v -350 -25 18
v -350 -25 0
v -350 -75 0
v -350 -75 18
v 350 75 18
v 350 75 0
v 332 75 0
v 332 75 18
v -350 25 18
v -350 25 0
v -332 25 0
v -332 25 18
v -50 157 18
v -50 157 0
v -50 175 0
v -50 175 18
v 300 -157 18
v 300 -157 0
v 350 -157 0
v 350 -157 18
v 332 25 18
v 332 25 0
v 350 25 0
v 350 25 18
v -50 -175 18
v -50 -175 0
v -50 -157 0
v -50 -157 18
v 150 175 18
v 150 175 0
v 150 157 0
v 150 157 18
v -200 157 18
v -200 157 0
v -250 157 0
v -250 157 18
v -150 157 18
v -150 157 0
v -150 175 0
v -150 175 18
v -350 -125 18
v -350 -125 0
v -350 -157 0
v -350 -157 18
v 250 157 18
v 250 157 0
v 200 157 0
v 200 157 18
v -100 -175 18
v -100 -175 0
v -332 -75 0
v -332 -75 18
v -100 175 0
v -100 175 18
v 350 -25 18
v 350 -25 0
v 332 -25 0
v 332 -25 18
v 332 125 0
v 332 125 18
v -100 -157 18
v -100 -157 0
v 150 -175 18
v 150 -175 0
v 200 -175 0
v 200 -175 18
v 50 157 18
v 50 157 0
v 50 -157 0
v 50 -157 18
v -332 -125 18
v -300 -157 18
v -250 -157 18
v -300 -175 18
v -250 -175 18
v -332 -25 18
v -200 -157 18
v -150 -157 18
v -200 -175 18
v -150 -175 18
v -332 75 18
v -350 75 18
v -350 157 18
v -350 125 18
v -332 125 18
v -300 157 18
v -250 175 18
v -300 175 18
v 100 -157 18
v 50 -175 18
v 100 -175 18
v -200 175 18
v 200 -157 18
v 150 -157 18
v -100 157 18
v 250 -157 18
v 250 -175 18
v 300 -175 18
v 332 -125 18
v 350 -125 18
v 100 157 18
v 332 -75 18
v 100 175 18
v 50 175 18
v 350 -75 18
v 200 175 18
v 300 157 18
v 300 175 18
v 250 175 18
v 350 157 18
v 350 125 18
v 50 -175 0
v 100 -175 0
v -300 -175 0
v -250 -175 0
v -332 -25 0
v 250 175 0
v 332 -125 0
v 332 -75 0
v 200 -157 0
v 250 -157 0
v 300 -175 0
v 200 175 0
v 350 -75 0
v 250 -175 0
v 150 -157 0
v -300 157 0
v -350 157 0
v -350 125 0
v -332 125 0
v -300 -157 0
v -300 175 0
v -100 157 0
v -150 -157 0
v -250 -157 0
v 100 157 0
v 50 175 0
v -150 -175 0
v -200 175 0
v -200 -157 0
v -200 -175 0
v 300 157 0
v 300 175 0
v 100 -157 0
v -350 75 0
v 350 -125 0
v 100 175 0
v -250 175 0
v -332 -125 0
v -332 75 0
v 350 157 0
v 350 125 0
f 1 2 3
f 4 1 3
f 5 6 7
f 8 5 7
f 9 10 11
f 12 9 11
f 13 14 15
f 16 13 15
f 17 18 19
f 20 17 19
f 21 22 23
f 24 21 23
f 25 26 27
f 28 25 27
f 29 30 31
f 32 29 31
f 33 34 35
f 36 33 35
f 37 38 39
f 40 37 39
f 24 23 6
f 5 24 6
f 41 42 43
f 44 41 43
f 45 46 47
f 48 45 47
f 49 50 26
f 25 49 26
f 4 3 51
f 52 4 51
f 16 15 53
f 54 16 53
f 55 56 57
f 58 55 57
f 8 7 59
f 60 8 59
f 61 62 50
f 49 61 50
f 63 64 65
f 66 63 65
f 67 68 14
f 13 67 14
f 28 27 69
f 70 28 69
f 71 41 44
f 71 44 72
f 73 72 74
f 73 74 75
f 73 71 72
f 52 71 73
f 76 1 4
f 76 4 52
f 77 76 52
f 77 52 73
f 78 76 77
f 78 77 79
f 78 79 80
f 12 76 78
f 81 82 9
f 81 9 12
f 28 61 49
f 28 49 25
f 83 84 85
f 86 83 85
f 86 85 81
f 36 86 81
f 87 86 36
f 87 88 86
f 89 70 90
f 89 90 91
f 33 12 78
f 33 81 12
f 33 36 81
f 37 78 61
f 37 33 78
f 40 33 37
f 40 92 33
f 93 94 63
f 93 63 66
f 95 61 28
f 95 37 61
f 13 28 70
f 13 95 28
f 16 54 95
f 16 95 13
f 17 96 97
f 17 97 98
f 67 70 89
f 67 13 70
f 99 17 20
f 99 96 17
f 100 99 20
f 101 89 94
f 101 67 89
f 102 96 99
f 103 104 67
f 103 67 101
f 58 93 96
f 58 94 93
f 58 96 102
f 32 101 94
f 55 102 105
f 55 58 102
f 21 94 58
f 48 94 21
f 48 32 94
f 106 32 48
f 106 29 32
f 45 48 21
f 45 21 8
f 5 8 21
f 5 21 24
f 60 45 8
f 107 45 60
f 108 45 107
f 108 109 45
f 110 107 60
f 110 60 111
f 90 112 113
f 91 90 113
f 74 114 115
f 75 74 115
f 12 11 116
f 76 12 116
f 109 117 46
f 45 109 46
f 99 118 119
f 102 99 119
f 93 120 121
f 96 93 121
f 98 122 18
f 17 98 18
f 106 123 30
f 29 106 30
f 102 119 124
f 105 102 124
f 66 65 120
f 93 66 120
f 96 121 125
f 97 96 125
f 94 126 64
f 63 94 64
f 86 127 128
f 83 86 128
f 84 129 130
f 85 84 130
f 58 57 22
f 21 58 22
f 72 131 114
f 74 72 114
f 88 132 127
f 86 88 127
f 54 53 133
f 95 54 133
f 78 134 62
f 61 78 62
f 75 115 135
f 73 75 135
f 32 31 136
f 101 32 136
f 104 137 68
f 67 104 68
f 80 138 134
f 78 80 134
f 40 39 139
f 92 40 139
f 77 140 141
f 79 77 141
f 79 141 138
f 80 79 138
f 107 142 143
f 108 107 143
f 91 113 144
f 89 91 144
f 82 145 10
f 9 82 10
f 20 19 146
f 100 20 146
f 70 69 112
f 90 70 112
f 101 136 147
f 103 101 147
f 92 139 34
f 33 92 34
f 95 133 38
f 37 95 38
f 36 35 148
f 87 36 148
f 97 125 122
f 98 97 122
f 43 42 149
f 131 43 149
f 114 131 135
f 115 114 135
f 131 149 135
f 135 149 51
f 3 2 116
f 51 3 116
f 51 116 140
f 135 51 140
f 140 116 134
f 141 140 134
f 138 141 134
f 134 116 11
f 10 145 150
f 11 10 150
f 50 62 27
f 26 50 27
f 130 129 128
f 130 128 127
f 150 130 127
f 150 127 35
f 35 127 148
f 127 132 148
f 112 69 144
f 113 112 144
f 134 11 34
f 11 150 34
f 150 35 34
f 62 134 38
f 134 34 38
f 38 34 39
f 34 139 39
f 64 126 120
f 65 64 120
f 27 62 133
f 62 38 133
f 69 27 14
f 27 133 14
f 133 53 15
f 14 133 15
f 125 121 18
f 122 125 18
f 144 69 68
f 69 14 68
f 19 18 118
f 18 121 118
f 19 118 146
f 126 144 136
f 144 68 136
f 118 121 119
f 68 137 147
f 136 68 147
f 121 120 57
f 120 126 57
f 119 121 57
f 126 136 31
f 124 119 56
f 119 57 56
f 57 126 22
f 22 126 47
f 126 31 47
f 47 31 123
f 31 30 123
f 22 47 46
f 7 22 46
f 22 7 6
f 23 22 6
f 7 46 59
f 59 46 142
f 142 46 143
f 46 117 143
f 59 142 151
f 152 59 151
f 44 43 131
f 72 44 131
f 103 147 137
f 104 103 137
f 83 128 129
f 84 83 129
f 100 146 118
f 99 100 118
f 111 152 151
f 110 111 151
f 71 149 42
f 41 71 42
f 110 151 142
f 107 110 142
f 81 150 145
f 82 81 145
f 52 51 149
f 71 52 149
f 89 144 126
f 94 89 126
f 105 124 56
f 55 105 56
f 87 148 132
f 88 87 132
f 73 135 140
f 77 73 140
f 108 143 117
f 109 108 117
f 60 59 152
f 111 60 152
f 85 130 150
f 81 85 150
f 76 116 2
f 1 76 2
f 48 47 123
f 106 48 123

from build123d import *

# Parameters (mm, degrees)
F1_DEPTH = 18


with BuildPart() as f1:
    # F0 (on Top) → F1 (new body)
    with BuildSketch(Plane.XY):
        Polygon((-350, -125), (-350, -157), (-300, -157), (-300, -175), (-250, -175), (-250, -157), (-200, -157), (-200, -175), (-150, -175), (-150, -157), (-100, -157), (-100, -175), (-50, -175), (-50, -157), (0, -157), (50, -157), (50, -175), (100, -175), (100, -157), (150, -157), (150, -175), (200, -175), (200, -157), (250, -157), (250, -175), (300, -175), (300, -157), (332, -157), (350, -157), (350, -125), (332, -125), (332, -75), (350, -75), (350, -25), (332, -25), (332, 25), (350, 25), (350, 75), (332, 75), (332, 125), (350, 125), (350, 157), (300, 157), (300, 175), (250, 175), (250, 157), (200, 157), (200, 175), (150, 175), (150, 157), (100, 157), (100, 175), (50, 175), (50, 157), (0, 157), (-50, 157), (-50, 175), (-100, 175), (-100, 157), (-150, 157), (-150, 175), (-200, 175), (-200, 157), (-250, 157), (-250, 175), (-300, 175), (-300, 157), (-350, 157), (-350, 125), (-332, 125), (-332, 75), (-350, 75), (-350, 25), (-332, 25), (-332, -25), (-350, -25), (-350, -75), (-332, -75), (-332, -125), align=None)
    extrude(amount=F1_DEPTH)


solid = f1.part
